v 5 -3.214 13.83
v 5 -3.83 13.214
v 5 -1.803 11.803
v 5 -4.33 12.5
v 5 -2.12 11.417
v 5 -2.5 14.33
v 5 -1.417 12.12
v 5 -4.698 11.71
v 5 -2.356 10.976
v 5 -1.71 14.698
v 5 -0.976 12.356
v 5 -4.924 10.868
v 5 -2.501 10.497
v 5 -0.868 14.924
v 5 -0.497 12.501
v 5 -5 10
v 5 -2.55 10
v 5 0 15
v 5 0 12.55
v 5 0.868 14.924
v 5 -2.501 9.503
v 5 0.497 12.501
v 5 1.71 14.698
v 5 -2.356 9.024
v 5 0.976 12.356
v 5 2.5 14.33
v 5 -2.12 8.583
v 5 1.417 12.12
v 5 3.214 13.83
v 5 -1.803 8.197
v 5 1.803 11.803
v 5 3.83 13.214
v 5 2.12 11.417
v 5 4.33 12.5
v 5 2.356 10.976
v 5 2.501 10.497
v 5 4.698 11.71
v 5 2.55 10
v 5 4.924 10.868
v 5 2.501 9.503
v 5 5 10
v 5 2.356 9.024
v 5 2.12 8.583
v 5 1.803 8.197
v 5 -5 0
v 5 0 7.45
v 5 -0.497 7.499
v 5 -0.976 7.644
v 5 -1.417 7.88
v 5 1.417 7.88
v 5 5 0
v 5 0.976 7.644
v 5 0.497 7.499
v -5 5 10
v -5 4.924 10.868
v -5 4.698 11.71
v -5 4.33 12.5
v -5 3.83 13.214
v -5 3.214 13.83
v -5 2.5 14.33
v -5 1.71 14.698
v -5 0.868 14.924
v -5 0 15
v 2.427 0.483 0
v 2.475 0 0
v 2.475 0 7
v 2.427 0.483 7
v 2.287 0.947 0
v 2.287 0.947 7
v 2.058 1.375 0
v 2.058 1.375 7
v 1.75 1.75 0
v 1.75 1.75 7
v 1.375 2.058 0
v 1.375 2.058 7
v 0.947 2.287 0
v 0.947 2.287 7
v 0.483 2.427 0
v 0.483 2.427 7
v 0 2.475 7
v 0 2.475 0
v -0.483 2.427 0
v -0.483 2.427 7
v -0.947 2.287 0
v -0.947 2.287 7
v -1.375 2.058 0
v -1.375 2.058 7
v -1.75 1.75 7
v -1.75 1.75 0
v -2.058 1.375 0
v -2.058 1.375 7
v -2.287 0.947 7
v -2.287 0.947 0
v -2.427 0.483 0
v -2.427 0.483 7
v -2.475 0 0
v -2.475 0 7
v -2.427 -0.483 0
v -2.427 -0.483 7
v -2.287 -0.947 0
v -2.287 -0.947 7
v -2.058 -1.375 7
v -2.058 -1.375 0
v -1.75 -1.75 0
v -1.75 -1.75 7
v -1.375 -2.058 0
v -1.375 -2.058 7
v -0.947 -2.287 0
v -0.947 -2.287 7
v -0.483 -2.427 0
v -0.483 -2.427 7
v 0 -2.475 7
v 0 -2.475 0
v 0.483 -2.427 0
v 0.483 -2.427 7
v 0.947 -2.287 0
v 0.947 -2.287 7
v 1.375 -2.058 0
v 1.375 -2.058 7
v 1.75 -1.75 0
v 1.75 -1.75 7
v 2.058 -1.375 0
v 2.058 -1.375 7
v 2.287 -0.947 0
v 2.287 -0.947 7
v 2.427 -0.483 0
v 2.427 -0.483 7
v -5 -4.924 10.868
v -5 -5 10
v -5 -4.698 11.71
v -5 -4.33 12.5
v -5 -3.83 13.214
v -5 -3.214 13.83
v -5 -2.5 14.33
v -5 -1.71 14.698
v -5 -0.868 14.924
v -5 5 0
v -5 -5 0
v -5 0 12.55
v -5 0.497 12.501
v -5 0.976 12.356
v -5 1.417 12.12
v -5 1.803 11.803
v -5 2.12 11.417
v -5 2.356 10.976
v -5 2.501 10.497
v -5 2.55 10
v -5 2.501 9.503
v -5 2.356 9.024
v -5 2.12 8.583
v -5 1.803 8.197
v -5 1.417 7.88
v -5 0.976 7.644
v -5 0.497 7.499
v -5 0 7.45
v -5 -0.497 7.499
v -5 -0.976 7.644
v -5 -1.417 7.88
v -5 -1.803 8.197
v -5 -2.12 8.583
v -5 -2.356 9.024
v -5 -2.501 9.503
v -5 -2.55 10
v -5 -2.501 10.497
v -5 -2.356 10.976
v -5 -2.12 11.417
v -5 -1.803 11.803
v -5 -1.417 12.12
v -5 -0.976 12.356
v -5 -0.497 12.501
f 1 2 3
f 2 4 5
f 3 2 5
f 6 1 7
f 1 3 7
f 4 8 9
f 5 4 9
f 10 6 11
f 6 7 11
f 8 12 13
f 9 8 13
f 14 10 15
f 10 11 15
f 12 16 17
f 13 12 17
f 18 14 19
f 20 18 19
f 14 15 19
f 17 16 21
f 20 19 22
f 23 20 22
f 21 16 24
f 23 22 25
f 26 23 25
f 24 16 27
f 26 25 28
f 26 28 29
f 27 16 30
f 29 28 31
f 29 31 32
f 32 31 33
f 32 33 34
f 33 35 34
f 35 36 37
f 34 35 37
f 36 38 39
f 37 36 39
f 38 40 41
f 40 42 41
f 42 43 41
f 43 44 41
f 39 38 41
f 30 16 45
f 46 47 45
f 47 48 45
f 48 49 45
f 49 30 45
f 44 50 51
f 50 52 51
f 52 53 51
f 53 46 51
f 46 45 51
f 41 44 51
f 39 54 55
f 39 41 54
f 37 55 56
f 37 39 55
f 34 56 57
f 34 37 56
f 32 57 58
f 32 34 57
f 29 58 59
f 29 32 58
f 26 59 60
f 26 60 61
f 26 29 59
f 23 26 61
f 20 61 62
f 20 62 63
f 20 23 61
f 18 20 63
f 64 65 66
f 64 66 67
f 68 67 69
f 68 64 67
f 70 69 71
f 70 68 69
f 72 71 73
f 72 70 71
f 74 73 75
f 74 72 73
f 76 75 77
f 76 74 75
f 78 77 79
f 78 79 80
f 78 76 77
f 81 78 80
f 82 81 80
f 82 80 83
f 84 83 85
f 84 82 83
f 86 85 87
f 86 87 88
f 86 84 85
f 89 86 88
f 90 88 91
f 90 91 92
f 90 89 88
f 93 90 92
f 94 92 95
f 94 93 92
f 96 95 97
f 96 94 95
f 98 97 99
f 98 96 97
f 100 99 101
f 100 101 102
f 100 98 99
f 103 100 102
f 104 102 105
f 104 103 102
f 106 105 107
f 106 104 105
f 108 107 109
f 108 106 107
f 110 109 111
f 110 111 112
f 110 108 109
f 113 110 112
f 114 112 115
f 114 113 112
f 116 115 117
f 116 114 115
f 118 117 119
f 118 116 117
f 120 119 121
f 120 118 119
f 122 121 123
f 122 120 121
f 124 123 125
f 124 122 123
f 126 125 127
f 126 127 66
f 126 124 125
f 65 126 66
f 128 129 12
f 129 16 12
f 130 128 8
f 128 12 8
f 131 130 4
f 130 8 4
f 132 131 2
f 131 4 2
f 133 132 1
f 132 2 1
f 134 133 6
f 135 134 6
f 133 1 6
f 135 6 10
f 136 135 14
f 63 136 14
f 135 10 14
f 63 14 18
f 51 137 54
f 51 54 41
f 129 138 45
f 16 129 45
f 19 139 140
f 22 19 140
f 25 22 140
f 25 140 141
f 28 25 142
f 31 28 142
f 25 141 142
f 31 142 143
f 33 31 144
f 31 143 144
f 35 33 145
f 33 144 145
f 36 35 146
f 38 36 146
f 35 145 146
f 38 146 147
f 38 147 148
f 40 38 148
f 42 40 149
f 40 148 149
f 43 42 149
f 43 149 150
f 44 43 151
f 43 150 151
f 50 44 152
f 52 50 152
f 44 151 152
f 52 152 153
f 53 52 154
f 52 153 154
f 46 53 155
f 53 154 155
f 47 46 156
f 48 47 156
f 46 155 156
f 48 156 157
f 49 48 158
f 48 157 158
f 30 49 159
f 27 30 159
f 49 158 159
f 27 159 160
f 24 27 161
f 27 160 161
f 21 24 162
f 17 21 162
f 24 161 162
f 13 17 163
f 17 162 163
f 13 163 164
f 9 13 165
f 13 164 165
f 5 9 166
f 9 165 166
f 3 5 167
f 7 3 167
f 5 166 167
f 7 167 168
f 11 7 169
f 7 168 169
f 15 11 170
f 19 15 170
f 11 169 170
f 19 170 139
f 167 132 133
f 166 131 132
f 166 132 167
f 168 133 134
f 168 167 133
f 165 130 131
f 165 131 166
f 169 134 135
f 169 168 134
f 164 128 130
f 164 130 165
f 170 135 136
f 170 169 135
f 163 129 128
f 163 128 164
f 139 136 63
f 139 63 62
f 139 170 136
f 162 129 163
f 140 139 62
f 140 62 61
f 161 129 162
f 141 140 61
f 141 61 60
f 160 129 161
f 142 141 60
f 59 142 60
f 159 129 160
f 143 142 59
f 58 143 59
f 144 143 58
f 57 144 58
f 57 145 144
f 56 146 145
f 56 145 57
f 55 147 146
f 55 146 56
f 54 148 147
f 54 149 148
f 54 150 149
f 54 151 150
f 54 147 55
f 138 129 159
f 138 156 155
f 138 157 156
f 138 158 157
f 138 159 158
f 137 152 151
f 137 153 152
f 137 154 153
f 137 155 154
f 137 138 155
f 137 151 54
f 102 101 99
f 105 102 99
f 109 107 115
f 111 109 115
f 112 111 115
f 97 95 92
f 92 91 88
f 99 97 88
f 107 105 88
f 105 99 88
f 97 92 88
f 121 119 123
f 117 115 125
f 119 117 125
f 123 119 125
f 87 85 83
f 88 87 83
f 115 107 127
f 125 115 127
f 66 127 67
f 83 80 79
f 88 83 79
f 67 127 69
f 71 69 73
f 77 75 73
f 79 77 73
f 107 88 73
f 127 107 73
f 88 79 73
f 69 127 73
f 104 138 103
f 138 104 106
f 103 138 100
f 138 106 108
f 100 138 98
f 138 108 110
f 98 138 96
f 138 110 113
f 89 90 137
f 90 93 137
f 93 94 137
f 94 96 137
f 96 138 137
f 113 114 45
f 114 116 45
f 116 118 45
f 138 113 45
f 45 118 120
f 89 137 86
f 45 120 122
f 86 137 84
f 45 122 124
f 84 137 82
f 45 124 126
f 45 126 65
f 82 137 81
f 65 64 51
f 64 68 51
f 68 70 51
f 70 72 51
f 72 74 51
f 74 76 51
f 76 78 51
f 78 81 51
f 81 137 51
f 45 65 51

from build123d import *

# Parameters (mm, degrees)
SKETCH1_W           = 10
SKETCH1_H           = 10
SKETCH1_R           = 2.475
BOSS_EXTRUDE2_DEPTH = 15
SKETCH2_R           = 2.55
CUT_EXTRUDE1_DEPTH  = 10
FILLET1_R           = 5
SKETCH1_5_R         = 2.475
CUT_EXTRUDE2_DEPTH  = 7


with BuildPart() as part:
    # Sketch1 → Boss-Extrude2 (new body)
    # profile 1 of 2: a face of its own
    with BuildSketch(Plane.XY):
        Rectangle(SKETCH1_W, SKETCH1_H)
        Circle(SKETCH1_R, mode=Mode.SUBTRACT)
    # profile 2 of 2: a face of its own
    with BuildSketch(Plane.XY):
        Circle(SKETCH1_R)
    extrude(amount=BOSS_EXTRUDE2_DEPTH)

    # Sketch2 → Cut-Extrude1 (cut)
    with BuildSketch(Plane.ZY.offset(5)):
        with Locations((10, 0)):
            Circle(SKETCH2_R)
    extrude(amount=-CUT_EXTRUDE1_DEPTH, mode=Mode.SUBTRACT)

    # Fillet1
    fillet1_edges = [part.edges().sort_by_distance(p)[0] for p in [
        (0, -5, 15),
        (0, 5, 15),
    ]]
    fillet(fillet1_edges, radius=FILLET1_R - 0.0001)  # a hair under: the kernel refuses the full size

    # Sketch1<5> → Cut-Extrude2 (cut)
    with BuildSketch(Plane.XY):
        Circle(SKETCH1_5_R)
    extrude(amount=CUT_EXTRUDE2_DEPTH, mode=Mode.SUBTRACT)


solid = part.part
